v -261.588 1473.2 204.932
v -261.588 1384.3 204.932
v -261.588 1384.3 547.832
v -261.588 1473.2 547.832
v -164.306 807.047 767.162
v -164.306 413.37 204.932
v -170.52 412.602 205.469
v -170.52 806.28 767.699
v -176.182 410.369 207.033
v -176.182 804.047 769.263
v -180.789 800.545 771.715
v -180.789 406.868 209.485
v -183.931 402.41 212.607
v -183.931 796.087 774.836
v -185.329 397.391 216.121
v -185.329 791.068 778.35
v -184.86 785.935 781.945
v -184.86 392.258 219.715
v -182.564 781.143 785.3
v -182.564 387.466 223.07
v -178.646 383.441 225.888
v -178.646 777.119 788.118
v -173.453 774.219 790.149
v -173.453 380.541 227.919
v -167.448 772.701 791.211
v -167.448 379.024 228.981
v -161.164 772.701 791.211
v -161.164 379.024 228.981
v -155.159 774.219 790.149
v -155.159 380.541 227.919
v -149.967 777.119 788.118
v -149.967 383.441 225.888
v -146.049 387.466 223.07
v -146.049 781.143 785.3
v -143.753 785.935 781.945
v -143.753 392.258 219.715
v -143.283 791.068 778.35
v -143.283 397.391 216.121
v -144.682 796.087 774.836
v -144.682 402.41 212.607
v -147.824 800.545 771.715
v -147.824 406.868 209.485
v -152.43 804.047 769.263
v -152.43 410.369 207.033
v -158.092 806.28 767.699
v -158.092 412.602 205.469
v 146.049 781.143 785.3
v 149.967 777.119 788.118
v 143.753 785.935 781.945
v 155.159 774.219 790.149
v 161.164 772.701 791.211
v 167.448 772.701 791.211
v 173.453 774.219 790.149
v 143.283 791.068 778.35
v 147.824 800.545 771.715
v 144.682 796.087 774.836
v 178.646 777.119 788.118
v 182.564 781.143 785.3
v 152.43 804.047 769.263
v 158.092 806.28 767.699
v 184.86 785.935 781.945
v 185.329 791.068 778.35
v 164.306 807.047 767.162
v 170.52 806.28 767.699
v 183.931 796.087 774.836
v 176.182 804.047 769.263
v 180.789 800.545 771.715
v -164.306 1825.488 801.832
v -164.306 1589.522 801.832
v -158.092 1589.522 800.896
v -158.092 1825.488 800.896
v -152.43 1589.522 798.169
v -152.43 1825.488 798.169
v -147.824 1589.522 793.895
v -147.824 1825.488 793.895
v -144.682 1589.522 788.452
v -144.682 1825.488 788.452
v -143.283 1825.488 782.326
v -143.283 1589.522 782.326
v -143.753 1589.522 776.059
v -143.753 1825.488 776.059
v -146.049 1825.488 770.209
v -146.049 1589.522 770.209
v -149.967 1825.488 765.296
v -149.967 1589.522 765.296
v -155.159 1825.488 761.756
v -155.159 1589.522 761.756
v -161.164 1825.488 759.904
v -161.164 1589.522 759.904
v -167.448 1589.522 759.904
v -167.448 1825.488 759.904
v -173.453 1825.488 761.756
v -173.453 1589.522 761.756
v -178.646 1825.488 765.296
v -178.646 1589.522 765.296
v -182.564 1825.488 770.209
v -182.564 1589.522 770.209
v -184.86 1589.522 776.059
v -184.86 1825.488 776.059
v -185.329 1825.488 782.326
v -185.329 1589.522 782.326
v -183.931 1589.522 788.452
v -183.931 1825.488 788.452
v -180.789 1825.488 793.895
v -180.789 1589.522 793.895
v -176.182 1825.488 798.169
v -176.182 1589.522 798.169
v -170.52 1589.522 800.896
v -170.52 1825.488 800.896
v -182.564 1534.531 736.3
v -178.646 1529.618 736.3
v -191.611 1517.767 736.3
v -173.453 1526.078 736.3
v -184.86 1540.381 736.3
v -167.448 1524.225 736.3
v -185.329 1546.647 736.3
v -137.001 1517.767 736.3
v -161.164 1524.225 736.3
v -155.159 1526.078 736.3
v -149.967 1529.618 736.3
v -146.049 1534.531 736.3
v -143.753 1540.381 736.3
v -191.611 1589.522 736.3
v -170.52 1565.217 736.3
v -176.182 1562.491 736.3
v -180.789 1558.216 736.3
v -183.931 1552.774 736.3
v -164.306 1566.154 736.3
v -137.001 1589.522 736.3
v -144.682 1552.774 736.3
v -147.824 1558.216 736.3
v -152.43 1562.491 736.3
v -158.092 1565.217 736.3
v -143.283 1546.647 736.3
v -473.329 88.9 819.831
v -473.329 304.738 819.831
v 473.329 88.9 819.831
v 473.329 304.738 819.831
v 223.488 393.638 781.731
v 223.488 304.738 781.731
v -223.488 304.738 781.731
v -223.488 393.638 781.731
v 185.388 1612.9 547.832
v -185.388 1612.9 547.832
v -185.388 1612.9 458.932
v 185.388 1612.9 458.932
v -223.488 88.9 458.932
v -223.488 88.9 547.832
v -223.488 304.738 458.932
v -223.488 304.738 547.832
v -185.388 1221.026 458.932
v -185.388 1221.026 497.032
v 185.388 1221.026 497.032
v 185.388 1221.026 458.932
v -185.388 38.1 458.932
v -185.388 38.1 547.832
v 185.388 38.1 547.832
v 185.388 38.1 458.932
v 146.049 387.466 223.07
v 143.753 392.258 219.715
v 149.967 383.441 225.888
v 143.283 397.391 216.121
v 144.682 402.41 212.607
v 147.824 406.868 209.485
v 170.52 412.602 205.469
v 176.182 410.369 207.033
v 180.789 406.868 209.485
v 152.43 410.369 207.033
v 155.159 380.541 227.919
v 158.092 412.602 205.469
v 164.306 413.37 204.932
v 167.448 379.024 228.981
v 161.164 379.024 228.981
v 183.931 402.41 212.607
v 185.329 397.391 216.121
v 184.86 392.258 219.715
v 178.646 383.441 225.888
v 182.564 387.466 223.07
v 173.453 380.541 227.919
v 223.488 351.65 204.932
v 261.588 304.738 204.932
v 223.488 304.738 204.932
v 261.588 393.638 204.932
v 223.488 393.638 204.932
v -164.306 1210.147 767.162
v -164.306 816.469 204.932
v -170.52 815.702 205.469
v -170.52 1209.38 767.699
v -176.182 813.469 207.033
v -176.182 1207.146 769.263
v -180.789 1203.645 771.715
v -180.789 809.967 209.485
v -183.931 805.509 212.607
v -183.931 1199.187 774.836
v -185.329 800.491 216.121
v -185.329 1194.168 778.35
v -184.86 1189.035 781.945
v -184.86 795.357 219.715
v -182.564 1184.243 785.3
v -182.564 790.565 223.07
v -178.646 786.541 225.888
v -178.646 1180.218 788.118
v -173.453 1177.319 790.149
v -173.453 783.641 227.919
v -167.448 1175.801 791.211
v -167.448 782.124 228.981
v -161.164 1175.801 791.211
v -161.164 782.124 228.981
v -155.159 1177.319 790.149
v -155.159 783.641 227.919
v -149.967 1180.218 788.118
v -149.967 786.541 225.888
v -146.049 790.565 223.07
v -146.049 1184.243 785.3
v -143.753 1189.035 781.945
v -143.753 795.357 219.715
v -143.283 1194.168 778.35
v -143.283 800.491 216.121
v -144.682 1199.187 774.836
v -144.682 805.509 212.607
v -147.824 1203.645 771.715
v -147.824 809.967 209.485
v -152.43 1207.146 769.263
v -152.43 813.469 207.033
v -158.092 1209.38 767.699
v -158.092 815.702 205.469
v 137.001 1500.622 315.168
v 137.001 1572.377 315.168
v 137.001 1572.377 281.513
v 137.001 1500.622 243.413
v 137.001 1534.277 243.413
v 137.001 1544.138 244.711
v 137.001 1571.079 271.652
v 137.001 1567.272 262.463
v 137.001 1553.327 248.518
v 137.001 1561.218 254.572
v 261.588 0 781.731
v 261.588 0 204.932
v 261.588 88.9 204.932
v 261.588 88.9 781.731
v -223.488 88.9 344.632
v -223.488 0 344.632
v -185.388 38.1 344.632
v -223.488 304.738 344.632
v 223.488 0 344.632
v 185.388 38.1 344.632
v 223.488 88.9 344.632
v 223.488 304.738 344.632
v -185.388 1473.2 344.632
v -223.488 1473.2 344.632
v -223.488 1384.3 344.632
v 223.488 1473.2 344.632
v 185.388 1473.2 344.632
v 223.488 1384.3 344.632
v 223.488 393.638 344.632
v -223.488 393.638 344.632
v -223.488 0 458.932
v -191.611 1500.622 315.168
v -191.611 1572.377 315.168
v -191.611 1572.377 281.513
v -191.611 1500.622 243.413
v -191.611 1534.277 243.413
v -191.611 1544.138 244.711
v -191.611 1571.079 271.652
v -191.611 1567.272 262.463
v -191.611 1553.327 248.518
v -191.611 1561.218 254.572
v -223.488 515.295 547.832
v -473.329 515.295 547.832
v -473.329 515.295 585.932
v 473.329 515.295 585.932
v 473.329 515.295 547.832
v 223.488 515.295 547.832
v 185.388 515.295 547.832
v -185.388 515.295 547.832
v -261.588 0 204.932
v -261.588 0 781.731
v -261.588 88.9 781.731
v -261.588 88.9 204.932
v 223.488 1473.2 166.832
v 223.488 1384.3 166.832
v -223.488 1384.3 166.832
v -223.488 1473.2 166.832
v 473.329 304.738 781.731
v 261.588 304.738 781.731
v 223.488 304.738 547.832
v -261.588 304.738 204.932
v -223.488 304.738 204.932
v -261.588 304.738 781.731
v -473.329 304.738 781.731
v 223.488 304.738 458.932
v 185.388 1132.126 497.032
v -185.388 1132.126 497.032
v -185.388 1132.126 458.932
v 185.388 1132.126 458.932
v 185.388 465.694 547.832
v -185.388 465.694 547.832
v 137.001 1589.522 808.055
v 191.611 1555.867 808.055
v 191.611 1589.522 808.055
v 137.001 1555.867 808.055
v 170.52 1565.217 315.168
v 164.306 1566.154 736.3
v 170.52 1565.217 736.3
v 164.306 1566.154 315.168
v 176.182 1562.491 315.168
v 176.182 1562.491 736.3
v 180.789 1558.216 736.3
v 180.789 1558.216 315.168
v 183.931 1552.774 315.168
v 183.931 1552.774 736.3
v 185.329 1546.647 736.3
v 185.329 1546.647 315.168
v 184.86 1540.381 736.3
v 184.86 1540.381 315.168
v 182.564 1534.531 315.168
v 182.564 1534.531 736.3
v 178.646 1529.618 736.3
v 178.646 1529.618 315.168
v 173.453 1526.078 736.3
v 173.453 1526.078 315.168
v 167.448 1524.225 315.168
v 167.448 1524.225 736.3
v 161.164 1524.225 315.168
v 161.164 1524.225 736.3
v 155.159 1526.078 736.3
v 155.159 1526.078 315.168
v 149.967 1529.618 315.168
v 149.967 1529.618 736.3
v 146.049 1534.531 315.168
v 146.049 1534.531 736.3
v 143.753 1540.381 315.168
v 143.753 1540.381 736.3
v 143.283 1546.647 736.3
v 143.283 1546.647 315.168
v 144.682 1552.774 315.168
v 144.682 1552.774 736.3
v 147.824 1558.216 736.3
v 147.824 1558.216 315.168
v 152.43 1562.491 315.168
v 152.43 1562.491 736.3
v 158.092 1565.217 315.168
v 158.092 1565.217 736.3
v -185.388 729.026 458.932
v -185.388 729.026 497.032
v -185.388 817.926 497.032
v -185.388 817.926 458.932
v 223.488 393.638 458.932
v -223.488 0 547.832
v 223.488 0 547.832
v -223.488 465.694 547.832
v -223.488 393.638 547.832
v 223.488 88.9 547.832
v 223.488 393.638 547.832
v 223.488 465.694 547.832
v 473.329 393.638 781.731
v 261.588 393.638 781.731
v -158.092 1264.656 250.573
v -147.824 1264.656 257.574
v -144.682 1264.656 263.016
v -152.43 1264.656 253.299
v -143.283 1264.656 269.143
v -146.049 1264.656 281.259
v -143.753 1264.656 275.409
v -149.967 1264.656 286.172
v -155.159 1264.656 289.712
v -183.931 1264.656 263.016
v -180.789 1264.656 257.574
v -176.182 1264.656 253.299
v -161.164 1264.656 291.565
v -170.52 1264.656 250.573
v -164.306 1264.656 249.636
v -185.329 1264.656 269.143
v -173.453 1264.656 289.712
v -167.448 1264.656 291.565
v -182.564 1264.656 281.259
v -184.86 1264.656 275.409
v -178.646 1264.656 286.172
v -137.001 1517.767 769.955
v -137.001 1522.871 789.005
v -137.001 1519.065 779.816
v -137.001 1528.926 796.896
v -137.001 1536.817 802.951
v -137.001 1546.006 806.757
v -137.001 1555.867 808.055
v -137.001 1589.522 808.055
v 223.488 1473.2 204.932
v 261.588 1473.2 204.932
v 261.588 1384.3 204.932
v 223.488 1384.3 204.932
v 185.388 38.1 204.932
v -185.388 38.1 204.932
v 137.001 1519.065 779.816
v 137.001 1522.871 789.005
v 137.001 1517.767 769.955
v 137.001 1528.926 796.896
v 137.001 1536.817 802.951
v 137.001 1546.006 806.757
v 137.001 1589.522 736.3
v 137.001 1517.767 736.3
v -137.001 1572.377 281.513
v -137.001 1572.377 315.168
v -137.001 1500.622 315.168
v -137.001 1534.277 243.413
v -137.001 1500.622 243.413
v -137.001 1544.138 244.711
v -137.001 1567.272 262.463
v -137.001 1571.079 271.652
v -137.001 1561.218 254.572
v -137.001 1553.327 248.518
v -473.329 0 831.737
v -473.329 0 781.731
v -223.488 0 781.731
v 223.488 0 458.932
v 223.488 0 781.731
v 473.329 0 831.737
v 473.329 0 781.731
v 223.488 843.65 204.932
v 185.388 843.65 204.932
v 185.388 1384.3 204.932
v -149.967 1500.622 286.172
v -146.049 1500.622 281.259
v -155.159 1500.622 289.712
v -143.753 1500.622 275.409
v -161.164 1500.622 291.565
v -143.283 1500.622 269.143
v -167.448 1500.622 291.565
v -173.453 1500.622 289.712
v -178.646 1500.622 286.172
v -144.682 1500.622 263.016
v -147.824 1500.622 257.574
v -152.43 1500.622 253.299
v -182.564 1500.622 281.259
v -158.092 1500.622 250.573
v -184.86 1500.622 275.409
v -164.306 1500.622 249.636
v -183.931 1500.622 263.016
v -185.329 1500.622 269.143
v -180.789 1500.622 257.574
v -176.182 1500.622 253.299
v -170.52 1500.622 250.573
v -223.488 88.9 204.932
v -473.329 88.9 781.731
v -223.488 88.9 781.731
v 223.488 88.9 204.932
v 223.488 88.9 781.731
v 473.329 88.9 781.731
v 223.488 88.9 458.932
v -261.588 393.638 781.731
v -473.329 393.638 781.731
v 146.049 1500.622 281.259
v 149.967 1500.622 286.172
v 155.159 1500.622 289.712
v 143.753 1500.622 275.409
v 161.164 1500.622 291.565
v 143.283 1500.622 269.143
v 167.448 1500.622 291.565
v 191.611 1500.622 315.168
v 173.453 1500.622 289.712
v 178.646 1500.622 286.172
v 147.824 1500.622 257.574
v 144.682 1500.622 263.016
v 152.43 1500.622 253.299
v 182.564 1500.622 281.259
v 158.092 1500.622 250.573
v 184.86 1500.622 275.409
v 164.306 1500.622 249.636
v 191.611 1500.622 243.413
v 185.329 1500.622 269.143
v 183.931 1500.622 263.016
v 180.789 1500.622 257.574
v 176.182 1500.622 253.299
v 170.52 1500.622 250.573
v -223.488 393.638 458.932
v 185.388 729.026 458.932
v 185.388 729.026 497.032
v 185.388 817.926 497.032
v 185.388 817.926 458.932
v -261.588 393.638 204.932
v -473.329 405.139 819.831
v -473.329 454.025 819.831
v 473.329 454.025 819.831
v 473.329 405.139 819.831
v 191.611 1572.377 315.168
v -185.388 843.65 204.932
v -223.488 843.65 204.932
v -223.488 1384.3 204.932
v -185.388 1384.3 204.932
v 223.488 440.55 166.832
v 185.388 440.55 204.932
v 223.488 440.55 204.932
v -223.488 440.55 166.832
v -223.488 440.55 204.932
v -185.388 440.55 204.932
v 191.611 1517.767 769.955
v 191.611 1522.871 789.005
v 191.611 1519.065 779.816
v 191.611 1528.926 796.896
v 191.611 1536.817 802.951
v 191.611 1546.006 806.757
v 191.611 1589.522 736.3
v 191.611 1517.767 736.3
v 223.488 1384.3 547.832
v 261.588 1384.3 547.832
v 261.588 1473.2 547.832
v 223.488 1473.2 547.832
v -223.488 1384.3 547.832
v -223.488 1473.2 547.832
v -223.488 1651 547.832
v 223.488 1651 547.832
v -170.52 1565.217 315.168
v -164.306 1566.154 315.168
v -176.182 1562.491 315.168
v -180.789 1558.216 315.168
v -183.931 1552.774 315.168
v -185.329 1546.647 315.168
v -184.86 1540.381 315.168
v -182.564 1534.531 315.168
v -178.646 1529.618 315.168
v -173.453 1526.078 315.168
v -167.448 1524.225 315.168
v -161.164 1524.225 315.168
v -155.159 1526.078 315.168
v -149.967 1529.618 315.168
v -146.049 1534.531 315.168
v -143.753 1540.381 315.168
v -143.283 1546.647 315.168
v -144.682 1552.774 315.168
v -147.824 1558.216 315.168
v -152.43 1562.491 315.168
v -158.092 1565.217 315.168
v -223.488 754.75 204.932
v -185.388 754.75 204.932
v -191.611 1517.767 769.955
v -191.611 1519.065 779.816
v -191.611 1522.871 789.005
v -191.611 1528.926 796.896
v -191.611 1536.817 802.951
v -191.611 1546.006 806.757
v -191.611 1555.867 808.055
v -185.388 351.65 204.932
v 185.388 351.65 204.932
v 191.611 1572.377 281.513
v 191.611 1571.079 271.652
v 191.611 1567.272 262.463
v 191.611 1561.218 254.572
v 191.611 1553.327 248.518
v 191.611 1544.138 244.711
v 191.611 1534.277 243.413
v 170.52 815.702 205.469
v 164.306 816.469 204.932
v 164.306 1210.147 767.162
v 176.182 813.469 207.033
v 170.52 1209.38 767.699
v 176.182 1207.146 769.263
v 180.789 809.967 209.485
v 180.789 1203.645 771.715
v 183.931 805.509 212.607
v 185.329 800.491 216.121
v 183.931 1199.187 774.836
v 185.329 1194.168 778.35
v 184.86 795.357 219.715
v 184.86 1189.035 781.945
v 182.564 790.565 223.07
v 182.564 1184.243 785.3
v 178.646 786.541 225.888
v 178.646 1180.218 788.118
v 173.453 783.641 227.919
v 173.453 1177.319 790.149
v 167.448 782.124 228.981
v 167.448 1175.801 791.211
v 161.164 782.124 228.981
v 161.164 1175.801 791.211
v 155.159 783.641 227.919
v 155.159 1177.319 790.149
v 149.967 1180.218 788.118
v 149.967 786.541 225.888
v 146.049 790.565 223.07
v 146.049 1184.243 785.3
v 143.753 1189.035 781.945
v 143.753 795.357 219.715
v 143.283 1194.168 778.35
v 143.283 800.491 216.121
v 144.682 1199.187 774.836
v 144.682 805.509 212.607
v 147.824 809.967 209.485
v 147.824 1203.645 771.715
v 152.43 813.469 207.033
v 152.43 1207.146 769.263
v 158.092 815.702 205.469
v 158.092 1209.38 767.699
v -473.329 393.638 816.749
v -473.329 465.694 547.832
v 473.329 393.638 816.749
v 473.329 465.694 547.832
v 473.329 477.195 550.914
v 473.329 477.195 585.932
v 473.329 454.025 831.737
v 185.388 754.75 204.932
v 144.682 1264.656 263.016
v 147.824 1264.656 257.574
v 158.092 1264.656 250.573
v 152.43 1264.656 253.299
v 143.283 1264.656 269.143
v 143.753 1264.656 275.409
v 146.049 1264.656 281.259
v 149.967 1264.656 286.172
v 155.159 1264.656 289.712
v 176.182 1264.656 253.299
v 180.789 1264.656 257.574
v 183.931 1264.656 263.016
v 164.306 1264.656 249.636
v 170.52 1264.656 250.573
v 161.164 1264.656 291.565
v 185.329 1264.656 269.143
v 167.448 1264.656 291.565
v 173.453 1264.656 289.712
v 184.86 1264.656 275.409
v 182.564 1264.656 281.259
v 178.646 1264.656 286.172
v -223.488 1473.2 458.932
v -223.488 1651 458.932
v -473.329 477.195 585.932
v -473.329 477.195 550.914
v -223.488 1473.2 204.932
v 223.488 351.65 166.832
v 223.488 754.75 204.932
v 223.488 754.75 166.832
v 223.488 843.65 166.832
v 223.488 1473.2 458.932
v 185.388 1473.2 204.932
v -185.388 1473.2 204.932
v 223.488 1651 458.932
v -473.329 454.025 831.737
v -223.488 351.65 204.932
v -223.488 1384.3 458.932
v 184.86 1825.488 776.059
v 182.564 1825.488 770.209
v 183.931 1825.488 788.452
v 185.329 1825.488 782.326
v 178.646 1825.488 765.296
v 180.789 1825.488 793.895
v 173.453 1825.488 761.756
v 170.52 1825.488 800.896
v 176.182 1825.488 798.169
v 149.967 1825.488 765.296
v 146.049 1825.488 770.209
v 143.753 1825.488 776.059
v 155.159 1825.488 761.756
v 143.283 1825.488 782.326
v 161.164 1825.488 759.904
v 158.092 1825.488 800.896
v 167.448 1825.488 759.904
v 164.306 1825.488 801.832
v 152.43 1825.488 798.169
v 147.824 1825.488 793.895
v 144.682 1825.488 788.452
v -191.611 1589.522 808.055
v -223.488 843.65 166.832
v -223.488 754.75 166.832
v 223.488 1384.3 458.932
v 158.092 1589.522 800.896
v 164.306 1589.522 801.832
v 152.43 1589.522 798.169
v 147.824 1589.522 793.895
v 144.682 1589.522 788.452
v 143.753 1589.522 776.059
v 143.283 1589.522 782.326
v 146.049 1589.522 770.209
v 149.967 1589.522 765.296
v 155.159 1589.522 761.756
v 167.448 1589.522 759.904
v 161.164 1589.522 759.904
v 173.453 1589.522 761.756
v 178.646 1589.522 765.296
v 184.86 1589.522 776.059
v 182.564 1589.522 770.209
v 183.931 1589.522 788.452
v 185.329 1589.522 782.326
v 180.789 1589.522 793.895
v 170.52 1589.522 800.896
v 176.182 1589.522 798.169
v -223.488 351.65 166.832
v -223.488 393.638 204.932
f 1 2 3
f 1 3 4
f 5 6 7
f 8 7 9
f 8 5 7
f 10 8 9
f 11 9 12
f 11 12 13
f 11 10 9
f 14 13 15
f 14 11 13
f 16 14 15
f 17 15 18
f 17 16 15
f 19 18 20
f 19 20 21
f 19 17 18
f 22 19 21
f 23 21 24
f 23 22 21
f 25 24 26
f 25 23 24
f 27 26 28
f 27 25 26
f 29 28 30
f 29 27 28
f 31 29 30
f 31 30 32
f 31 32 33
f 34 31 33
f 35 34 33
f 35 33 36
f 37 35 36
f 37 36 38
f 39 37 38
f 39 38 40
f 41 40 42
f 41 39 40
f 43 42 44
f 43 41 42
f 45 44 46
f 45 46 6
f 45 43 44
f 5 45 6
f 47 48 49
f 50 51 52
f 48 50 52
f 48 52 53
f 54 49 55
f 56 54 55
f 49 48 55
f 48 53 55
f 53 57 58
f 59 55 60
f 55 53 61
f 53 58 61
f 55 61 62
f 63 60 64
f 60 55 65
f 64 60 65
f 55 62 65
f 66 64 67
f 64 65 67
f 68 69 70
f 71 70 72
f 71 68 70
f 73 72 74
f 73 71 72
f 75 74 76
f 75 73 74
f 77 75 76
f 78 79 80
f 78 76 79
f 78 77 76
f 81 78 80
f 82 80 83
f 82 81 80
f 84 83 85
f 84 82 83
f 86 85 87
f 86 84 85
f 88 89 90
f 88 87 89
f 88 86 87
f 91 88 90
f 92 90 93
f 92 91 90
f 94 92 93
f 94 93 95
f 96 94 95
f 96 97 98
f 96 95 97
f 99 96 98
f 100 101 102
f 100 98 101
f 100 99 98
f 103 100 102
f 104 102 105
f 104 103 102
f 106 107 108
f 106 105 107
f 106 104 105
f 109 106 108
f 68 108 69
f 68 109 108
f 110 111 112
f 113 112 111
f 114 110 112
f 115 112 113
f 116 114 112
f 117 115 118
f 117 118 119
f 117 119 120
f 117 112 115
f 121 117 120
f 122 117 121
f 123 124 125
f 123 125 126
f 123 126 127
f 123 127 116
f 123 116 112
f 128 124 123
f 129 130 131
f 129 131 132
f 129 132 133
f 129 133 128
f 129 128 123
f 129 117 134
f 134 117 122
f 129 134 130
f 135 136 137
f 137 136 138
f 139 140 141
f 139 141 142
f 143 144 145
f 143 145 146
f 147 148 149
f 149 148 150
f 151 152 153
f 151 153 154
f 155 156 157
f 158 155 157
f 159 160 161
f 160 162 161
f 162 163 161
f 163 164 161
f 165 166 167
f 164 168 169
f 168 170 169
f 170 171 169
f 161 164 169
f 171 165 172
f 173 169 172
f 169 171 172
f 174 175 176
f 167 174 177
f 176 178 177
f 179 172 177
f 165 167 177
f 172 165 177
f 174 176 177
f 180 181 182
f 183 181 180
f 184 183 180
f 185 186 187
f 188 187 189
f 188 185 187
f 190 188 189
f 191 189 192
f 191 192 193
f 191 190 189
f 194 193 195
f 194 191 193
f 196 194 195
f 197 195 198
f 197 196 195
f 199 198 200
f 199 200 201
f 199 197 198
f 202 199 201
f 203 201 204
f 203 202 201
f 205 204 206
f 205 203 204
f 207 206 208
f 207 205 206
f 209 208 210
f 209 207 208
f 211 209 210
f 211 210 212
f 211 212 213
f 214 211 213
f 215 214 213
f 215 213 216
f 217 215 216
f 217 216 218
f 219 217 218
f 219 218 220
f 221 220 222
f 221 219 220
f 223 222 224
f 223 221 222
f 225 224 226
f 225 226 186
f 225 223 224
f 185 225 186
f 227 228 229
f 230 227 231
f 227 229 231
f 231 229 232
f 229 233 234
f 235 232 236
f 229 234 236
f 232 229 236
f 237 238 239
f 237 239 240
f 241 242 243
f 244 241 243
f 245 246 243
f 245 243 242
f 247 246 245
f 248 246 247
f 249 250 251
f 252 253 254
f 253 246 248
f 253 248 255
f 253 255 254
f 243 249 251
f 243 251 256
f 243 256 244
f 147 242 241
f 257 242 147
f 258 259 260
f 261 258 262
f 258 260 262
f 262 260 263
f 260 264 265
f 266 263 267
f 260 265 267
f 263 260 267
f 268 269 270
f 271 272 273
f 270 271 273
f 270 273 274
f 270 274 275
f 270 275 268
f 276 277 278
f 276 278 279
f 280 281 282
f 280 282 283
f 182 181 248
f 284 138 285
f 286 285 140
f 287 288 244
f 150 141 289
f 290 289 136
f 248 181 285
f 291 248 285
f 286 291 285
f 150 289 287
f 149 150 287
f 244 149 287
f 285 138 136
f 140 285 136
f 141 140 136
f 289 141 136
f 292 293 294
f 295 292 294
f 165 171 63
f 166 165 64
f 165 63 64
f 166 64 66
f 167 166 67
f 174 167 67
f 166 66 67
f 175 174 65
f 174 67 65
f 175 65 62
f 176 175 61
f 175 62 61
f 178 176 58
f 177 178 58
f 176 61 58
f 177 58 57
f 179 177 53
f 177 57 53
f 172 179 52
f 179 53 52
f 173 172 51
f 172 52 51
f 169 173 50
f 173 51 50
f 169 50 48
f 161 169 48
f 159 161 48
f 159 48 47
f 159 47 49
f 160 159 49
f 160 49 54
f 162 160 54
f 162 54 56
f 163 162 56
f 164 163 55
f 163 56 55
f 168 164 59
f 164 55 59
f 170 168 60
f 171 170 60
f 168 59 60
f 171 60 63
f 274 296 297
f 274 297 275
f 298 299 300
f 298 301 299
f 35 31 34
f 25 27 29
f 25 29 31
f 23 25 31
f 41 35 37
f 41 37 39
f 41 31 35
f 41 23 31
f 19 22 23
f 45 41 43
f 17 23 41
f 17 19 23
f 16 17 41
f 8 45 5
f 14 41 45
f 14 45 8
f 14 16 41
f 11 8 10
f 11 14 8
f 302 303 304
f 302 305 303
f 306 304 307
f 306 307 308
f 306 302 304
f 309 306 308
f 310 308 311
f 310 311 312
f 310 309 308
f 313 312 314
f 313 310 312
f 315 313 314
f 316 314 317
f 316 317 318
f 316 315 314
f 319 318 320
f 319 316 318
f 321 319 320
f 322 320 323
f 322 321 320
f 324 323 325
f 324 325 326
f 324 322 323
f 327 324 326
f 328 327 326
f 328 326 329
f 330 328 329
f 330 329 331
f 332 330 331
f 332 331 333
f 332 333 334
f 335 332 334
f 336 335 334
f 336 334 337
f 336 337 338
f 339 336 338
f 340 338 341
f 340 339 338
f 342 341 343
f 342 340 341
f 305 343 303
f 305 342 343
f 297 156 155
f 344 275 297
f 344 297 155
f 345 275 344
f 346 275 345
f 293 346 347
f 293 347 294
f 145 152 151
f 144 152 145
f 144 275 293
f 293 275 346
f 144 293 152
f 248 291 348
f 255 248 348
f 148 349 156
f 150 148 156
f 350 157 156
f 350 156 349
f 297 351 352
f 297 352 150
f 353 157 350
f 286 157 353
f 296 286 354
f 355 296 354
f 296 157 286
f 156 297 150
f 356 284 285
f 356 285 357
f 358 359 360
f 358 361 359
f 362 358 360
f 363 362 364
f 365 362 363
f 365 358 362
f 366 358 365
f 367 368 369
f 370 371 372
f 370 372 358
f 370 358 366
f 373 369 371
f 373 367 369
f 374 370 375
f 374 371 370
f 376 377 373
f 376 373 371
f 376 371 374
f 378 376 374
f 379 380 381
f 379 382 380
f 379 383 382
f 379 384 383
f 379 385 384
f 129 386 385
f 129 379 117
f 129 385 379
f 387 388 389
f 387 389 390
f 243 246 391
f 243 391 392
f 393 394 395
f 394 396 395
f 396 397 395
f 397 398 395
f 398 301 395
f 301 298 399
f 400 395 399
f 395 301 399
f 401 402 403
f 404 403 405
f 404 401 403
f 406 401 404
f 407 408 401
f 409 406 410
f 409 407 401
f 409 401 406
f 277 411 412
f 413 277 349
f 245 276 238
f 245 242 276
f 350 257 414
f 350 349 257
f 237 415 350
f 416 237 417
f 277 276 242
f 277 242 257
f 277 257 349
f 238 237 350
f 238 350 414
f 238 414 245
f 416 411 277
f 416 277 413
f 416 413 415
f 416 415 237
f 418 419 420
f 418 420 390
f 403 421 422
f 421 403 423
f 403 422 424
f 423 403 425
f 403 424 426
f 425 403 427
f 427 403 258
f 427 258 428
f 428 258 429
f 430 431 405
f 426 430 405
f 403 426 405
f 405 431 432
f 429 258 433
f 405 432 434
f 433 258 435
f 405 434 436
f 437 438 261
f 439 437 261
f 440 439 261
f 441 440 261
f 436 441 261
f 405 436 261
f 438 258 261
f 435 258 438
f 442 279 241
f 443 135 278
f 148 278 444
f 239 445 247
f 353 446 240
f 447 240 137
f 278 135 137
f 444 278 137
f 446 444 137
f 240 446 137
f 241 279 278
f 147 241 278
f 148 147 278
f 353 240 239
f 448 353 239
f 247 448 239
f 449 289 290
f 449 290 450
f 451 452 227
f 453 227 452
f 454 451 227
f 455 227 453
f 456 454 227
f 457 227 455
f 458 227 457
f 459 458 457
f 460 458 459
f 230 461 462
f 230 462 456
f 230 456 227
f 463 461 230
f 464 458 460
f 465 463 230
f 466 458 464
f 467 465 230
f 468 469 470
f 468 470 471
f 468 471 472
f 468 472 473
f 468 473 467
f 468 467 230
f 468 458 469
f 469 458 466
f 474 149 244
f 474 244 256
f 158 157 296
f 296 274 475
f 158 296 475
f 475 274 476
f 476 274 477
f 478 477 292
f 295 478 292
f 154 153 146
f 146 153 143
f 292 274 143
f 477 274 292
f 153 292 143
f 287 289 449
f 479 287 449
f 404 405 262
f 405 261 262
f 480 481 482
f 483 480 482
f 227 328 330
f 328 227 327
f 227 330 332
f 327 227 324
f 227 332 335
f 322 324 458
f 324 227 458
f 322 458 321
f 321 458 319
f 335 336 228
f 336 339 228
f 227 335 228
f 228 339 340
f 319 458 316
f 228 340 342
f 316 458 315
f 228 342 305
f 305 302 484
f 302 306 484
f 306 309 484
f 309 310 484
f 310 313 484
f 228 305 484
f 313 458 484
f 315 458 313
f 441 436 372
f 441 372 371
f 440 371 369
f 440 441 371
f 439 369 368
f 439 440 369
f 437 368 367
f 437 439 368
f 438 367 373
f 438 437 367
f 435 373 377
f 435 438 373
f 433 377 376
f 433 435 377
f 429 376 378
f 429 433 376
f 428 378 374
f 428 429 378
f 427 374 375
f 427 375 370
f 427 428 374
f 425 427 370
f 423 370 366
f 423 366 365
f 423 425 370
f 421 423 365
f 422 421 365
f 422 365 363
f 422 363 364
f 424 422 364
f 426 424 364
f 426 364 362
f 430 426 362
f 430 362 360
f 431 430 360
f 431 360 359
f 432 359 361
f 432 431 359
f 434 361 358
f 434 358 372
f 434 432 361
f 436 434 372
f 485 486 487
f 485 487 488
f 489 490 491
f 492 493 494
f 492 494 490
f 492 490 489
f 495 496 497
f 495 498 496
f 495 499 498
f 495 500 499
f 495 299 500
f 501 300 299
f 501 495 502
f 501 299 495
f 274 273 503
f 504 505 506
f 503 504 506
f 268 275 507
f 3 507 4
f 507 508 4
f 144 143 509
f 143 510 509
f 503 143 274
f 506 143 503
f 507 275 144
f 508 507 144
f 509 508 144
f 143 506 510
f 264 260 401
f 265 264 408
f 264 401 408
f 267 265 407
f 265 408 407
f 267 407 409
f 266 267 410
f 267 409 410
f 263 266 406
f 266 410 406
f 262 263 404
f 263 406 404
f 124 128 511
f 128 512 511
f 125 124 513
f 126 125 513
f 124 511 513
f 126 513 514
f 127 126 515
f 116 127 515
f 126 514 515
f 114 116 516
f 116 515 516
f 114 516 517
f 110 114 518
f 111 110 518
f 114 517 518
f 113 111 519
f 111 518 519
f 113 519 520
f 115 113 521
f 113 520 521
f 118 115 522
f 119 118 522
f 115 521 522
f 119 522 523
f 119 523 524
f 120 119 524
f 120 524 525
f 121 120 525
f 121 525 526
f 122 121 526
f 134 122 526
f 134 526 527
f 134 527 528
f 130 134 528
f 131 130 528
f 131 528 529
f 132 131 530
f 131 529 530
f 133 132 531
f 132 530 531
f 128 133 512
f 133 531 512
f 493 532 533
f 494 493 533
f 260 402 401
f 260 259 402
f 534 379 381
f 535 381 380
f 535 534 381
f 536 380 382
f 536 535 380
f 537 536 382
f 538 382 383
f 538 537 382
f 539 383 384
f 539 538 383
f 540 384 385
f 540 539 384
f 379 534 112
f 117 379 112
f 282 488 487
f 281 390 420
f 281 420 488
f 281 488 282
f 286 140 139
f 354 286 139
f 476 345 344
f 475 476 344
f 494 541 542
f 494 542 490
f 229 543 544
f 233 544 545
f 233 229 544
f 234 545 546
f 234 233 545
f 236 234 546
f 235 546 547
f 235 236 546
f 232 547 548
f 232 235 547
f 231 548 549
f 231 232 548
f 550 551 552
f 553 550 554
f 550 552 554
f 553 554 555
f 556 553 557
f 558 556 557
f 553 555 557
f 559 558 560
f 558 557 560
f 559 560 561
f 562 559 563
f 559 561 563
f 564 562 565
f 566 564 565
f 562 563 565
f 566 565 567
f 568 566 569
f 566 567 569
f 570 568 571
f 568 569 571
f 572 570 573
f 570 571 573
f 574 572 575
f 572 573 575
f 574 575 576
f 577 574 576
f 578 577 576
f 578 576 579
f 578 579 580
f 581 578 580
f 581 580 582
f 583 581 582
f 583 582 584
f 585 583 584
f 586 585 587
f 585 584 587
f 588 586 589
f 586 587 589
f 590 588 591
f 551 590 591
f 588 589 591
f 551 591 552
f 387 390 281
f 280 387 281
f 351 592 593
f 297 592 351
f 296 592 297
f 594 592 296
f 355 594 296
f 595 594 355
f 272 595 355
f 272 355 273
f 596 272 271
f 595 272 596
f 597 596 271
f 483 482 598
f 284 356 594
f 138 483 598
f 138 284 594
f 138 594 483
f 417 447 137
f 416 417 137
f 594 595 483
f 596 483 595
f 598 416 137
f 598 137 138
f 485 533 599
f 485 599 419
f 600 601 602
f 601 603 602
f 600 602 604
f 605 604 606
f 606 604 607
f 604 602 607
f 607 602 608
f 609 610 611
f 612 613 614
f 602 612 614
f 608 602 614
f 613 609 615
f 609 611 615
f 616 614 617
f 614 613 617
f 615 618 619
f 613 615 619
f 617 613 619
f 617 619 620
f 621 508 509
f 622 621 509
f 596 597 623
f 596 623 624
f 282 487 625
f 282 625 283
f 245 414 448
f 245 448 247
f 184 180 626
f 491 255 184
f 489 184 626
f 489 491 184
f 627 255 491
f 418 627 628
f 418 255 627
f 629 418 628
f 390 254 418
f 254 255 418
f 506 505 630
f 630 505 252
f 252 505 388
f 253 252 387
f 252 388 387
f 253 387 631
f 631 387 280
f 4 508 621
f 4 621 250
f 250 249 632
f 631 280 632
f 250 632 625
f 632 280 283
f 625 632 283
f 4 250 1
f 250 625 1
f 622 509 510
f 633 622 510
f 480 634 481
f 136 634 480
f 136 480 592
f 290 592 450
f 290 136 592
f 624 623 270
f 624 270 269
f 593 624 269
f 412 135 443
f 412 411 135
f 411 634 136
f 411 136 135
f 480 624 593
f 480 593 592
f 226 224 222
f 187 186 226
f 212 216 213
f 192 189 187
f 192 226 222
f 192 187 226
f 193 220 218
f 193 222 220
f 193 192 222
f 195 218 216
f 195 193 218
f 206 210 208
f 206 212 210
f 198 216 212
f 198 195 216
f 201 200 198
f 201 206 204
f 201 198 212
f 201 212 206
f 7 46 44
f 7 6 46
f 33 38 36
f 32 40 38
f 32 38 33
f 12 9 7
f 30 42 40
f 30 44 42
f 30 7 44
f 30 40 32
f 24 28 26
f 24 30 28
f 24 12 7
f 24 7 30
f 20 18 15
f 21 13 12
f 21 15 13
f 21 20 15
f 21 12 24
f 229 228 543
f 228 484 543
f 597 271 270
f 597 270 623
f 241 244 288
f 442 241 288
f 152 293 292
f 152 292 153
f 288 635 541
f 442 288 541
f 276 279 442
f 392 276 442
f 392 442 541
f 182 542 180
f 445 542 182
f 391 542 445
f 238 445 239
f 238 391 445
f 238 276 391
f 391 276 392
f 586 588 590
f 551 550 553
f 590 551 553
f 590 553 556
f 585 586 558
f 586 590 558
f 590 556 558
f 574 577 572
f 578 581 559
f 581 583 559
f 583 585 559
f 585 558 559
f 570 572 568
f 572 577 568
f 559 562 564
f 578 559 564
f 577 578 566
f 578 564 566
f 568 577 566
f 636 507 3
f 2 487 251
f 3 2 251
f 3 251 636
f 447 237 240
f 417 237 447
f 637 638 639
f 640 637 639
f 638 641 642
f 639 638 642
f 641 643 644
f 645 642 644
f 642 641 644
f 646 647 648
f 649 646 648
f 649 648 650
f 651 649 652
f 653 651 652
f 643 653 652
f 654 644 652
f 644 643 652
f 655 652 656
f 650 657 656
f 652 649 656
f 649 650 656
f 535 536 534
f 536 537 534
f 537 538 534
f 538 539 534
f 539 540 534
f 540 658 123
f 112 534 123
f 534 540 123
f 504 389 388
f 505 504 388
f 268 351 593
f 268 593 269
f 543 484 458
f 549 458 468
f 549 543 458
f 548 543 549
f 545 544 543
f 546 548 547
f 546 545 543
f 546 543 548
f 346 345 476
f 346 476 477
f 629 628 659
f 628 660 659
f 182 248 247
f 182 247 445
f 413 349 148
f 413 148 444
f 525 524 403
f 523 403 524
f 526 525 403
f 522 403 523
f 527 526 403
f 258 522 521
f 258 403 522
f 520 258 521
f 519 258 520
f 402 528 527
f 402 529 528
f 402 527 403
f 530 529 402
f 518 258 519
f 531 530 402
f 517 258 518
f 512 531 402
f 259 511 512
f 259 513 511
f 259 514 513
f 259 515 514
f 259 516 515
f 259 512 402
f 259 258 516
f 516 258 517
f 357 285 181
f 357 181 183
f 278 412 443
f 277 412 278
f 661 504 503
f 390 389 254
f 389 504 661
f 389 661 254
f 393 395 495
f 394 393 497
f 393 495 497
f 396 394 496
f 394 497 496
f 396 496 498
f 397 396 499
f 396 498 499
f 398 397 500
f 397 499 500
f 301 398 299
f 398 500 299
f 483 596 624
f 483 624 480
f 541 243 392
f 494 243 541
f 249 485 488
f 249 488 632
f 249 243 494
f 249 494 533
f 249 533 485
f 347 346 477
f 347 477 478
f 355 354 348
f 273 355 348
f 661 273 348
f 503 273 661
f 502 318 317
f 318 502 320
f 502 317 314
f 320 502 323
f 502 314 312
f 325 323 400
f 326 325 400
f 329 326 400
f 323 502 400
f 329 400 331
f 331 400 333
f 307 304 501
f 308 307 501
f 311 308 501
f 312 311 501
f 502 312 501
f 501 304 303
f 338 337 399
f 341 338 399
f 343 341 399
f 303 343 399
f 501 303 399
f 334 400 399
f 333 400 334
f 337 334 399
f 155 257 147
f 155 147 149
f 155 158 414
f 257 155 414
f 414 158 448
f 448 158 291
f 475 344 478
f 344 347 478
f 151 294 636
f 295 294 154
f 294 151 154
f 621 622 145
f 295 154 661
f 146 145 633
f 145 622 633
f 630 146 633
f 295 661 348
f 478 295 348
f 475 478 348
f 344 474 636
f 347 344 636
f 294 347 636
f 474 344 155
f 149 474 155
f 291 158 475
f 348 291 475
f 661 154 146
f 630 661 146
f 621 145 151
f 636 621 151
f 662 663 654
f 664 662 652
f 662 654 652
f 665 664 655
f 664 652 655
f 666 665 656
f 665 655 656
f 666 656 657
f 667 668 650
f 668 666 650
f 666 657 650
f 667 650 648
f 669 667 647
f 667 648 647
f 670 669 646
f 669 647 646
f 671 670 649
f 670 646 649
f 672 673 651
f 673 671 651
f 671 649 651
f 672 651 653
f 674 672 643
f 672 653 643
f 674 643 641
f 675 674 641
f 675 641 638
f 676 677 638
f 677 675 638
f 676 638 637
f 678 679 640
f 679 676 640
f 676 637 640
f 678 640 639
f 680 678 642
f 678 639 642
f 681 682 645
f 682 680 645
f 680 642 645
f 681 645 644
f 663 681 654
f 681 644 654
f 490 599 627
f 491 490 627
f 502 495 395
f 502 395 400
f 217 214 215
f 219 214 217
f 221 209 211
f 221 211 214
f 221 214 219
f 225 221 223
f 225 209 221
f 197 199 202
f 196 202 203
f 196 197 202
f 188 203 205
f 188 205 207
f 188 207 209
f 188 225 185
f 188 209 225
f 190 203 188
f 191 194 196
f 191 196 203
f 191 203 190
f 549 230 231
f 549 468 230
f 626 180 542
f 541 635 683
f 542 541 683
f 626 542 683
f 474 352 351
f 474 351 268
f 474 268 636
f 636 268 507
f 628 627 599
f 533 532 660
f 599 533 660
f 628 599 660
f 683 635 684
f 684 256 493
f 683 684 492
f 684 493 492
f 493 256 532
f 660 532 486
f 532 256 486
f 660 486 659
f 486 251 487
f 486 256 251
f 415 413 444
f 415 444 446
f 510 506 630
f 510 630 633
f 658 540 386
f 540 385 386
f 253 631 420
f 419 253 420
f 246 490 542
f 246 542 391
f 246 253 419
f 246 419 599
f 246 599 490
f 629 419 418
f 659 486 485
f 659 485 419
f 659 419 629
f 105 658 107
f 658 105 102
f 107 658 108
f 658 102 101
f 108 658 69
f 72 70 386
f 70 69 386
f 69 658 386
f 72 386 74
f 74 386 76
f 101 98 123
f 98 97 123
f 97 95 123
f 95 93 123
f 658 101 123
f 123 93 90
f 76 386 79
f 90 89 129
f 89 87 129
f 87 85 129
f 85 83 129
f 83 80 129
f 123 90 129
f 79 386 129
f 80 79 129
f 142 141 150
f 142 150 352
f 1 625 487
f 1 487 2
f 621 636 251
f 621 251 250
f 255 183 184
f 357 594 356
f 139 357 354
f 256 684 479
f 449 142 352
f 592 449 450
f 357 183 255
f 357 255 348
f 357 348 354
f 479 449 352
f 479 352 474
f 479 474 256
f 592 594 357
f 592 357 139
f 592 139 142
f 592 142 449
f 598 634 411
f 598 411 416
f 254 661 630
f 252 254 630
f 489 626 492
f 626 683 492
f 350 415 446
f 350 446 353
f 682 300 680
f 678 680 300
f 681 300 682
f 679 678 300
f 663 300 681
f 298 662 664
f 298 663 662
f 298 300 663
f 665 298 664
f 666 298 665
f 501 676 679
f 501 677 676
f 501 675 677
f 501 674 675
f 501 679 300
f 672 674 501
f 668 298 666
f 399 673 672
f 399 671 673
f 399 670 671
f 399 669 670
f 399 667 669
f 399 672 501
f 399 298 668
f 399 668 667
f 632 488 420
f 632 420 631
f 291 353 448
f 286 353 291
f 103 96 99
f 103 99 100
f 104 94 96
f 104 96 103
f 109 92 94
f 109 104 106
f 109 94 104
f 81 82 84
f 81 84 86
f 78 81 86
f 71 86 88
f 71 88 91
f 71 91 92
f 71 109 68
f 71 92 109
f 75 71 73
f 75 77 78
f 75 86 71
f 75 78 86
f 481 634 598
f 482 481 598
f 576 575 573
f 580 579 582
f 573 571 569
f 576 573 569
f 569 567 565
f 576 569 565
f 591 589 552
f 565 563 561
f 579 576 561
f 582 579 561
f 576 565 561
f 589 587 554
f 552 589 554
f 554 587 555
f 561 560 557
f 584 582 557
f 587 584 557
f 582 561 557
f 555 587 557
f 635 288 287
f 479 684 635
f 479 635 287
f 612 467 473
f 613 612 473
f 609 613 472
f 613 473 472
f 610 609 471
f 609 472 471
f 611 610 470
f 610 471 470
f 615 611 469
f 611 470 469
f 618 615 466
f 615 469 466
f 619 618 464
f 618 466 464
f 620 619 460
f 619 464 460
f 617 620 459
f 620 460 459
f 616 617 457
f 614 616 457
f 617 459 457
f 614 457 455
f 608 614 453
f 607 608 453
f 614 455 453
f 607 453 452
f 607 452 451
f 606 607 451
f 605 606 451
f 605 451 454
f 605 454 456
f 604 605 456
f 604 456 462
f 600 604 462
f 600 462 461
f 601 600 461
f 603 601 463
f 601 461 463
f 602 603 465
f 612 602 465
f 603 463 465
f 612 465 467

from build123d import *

# Parameters (mm, degrees)
SKETCH1_W            = 946.658829024
SKETCH1_H            = 454.025
BOSS_EXTRUDE3_DEPTH  = 11.90625
SKETCH5_W            = 21.082
SKETCH5_H            = 254
SKETCH6_W            = 457.2
SKETCH6_H            = 21.082
SKETCH7_W            = 21.082
SKETCH7_H            = 254
SKETCH8_W            = 71.755
SKETCH8_H            = 71.755
BOSS_EXTRUDE2_DEPTH  = 27.305
FILLET1_R            = 38.1
SKETCH10_W           = 446.9765
SKETCH10_H           = 1651
SKETCH10_W_2         = 370.7765
SKETCH10_H_2         = 1574.8
BOSS_EXTRUDE4_DEPTH  = 88.9
BOSS_EXTRUDE5_DEPTH  = 139.7
BOSS_EXTRUDE6_DEPTH  = 946.658829
SKETCH13_W           = 38.1
SKETCH13_H           = 88.9
BOSS_EXTRUDE7_DEPTH  = 223.48825
BOSS_EXTRUDE8_DEPTH  = 88.9
SKETCH16_W           = 38.1
SKETCH16_H           = 88.9
BOSS_EXTRUDE9_DEPTH  = 576.798407
SKETCH17_W           = 38.1
SKETCH17_H           = 88.9
BOSS_EXTRUDE10_DEPTH = 342.9
SKETCH19_W           = 38.1
SKETCH19_H           = 88.9
BOSS_EXTRUDE11_DEPTH = 370.7765


with BuildPart() as part:
    # Sketch1 → Boss-Extrude3 (new body)
    with BuildSketch(Plane.XY.offset(831.736844651)):
        with Locations((0, 227.0125)):
            Rectangle(SKETCH1_W, SKETCH1_H)
    extrude(amount=-BOSS_EXTRUDE3_DEPTH)



with BuildPart() as body_2:
    # Sketch3 → Revolve1 (revolve)
    with BuildSketch(Plane(origin=(164.30625, 0, 0), x_dir=(0, 0, -1), z_dir=(1, 0, 0))):
        Polygon((-779.254107605, 789.777894914), (-217.024326356, 396.100363878), (-204.932187925, 413.369727275), (-767.161969174, 807.047258312), align=None)
    revolve(axis=Axis((164.30625, 789.777894914, 779.254107605), (0, -0.573576436, -0.819152044)))


with BuildPart() as body_3:
    # Sketch4 → Revolve2 (revolve)
    with BuildSketch(Plane(origin=(164.30625, 0, 0), x_dir=(0, 0, -1), z_dir=(1, 0, 0))):
        Polygon((-779.254107605, 1192.877664024), (-217.024326356, 799.200132988), (-204.932187925, 816.469496385), (-767.161969174, 1210.147027422), align=None)
    revolve(axis=Axis((164.30625, 1192.877664024, 779.254107605), (0, -0.573576436, -0.819152044)))


with BuildPart() as body_4:
    # Sketch5 → Revolve3 (revolve)
    with BuildSketch(Plane(origin=(164.30625, 0, 0), x_dir=(0, 0, -1), z_dir=(1, 0, 0))):
        with Locations((-791.291187925, 1698.487839746)):
            Rectangle(SKETCH5_W, SKETCH5_H)
    revolve(axis=Axis((164.30625, 1825.487839746, 780.750187925), (0, -1, 0)))



with BuildPart() as body_5:
    # Sketch6 → Revolve4 (revolve)
    with BuildSketch(Plane(origin=(164.30625, 0, 0), x_dir=(0, 0, -1), z_dir=(1, 0, 0))):
        with Locations((-525.734187925, 1555.612839746)):
            Rectangle(SKETCH6_W, SKETCH6_H)
    revolve(axis=Axis((164.30625, 1545.071839746, 754.334187925), (0, 0, -1)))


with BuildPart() as body_6:
    # Sketch7 → Revolve5 (revolve)
    with BuildSketch(Plane(origin=(164.30625, 0, 0), x_dir=(0, 0, -1), z_dir=(1, 0, 0))):
        with Locations((-260.177187925, 1391.655839746)):
            Rectangle(SKETCH7_W, SKETCH7_H)
    revolve(axis=Axis((164.30625, 1518.655839746, 270.718187925), (0, -1, 0)))


with BuildPart() as body_4_1:
    add(body_4.part)

    add(body_5.part)  # Boss-Extrude2 merges body 5

    add(body_6.part)  # Boss-Extrude2 merges body 6
    # Sketch8 → Boss-Extrude2 (add, symmetric)
    with BuildSketch(Plane(origin=(164.30625, 0, 0), x_dir=(0, 0, -1), z_dir=(1, 0, 0))):
        with Locations((-772.177687925, 1553.644339746)):
            Rectangle(SKETCH8_W, SKETCH8_H)
        with Locations((-279.290687925, 1536.499339746)):
            Rectangle(SKETCH8_W, SKETCH8_H)
    extrude(amount=BOSS_EXTRUDE2_DEPTH, both=True)

    # Fillet1
    fillet1_edges = [body_4_1.edges().sort_by_distance(p)[0] for p in [
        (164.30625, 1517.766839746, 808.055187925),
        (164.30625, 1572.376839746, 243.413187925),
    ]]
    fillet(fillet1_edges, radius=FILLET1_R)


with BuildPart() as body_5_2:
    # Sketch10 → Boss-Extrude4 (new body)
    with BuildSketch(Plane.XY.offset(547.832187925)):
        with Locations((0, 825.5)):
            Rectangle(SKETCH10_W, SKETCH10_H)
        with Locations((0, 825.5)):
            Rectangle(SKETCH10_W_2, SKETCH10_H_2, mode=Mode.SUBTRACT)
    extrude(amount=-BOSS_EXTRUDE4_DEPTH)


with BuildPart() as body_6_2:
    # Sketch11 → Boss-Extrude5 (new body)
    with BuildSketch(Plane.XY.offset(344.632187925)):
        Polygon((223.48825, 1473.2), (185.38825, 1473.2), (185.38825, 38.1), (-185.38825, 38.1), (-185.38825, 1473.2), (-223.48825, 1473.2), (-223.48825, 0), (223.48825, 0), align=None)
    extrude(amount=-BOSS_EXTRUDE5_DEPTH)

    # Sketch13 → Boss-Extrude7 (add, symmetric)
    with BuildSketch(Plane(origin=(0, 0, 0), x_dir=(0, 0, -1), z_dir=(1, 0, 0))):
        with Locations((-185.882187925, 396.100363878)):
            Rectangle(SKETCH13_W, SKETCH13_H)
        with Locations((-185.882187925, 799.200132988)):
            Rectangle(SKETCH13_W, SKETCH13_H)
        with Locations((-185.882187925, 1428.75)):
            Rectangle(SKETCH13_W, SKETCH13_H)
    extrude(amount=BOSS_EXTRUDE7_DEPTH, both=True)


with BuildPart() as part_1:
    add(part.part)

    add(body_5_2.part)  # Boss-Extrude6 merges body 5 2
    # Sketch12 → Boss-Extrude6 (add)
    with BuildSketch(Plane(origin=(473.329414512, 0, 0), x_dir=(0, 0, -1), z_dir=(1, 0, 0))):
        Polygon((-781.730594651, 393.638059511), (-816.749030395, 393.638059511), (-819.830594651, 393.638059511), (-819.830594651, 304.738059511), (-781.730594651, 304.738059511), align=None)
        Polygon((-547.832187925, 465.694110282), (-547.832187925, 477.194664652), (-550.913752181, 477.194664652), (-819.830594651, 405.138613881), (-819.830594651, 393.638059511), (-816.749030395, 393.638059511), align=None)
        Polygon((-547.832187925, 477.194664652), (-547.832187925, 515.294664652), (-585.932187925, 515.294664652), (-585.932187925, 477.194664652), (-550.913752181, 477.194664652), align=None)
    extrude(amount=-BOSS_EXTRUDE6_DEPTH)


    add(body_6_2.part)  # Boss-Extrude8 merges body 6 2
    # Sketch14 → Boss-Extrude8 (add)
    with BuildSketch(Plane.XZ):
        Polygon((473.329414512, 819.830594651), (-473.329414512, 819.830594651), (-473.329414512, 781.730594651), (-261.58825, 781.730594651), (-261.58825, 204.932187925), (-223.48825, 204.932187925), (-223.48825, 781.730594651), (223.48825, 781.730594651), (223.48825, 204.932187925), (261.58825, 204.932187925), (261.58825, 781.730594651), (473.329414512, 781.730594651), align=None)
    extrude(amount=-BOSS_EXTRUDE8_DEPTH)

    # Sketch16 → Boss-Extrude9 (add)
    with BuildSketch(Plane(origin=(0, 0, 781.730594651), x_dir=(-1, 0, 0), z_dir=(0, 0, -1))):
        with Locations((-242.53825, 349.188059511)):
            Rectangle(SKETCH16_W, SKETCH16_H)
        with Locations((242.53825, 349.188059511)):
            Rectangle(SKETCH16_W, SKETCH16_H)
    extrude(amount=BOSS_EXTRUDE9_DEPTH)

    # Sketch17 → Boss-Extrude10 (add)
    with BuildSketch(Plane(origin=(0, 0, 204.932187925), x_dir=(-1, 0, 0), z_dir=(0, 0, -1))):
        with Locations((-242.53825, 1428.75)):
            Rectangle(SKETCH17_W, SKETCH17_H)
        with Locations((242.53825, 1428.75)):
            Rectangle(SKETCH17_W, SKETCH17_H)
    extrude(amount=-BOSS_EXTRUDE10_DEPTH)

    # Sketch19 → Boss-Extrude11 (add)
    with BuildSketch(Plane(origin=(-185.38825, 0, 0), x_dir=(0, 0, -1), z_dir=(1, 0, 0))):
        with Locations((-477.982187925, 1176.575854005)):
            Rectangle(SKETCH19_W, SKETCH19_H)
        with Locations((-477.982187925, 773.476084641)):
            Rectangle(SKETCH19_W, SKETCH19_H)
    extrude(amount=BOSS_EXTRUDE11_DEPTH)


with BuildPart() as body_5_3:
    # Mirror1: mirrored copy
    add(body_2.part.mirror(Plane(origin=(0, 0, 0), x_dir=(0, 0, 1), z_dir=(1, 0, 0))))


with BuildPart() as body_6_3:
    # Mirror1 2: mirrored copy
    add(body_3.part.mirror(Plane(origin=(0, 0, 0), x_dir=(0, 0, 1), z_dir=(1, 0, 0))))


with BuildPart() as body_7:
    # Mirror1 3: mirrored copy
    add(body_4_1.part.mirror(Plane(origin=(0, 0, 0), x_dir=(0, 0, 1), z_dir=(1, 0, 0))))


solid = Compound([body_2.part, body_3.part, body_4_1.part, part_1.part, body_5_3.part, body_6_3.part, body_7.part])
